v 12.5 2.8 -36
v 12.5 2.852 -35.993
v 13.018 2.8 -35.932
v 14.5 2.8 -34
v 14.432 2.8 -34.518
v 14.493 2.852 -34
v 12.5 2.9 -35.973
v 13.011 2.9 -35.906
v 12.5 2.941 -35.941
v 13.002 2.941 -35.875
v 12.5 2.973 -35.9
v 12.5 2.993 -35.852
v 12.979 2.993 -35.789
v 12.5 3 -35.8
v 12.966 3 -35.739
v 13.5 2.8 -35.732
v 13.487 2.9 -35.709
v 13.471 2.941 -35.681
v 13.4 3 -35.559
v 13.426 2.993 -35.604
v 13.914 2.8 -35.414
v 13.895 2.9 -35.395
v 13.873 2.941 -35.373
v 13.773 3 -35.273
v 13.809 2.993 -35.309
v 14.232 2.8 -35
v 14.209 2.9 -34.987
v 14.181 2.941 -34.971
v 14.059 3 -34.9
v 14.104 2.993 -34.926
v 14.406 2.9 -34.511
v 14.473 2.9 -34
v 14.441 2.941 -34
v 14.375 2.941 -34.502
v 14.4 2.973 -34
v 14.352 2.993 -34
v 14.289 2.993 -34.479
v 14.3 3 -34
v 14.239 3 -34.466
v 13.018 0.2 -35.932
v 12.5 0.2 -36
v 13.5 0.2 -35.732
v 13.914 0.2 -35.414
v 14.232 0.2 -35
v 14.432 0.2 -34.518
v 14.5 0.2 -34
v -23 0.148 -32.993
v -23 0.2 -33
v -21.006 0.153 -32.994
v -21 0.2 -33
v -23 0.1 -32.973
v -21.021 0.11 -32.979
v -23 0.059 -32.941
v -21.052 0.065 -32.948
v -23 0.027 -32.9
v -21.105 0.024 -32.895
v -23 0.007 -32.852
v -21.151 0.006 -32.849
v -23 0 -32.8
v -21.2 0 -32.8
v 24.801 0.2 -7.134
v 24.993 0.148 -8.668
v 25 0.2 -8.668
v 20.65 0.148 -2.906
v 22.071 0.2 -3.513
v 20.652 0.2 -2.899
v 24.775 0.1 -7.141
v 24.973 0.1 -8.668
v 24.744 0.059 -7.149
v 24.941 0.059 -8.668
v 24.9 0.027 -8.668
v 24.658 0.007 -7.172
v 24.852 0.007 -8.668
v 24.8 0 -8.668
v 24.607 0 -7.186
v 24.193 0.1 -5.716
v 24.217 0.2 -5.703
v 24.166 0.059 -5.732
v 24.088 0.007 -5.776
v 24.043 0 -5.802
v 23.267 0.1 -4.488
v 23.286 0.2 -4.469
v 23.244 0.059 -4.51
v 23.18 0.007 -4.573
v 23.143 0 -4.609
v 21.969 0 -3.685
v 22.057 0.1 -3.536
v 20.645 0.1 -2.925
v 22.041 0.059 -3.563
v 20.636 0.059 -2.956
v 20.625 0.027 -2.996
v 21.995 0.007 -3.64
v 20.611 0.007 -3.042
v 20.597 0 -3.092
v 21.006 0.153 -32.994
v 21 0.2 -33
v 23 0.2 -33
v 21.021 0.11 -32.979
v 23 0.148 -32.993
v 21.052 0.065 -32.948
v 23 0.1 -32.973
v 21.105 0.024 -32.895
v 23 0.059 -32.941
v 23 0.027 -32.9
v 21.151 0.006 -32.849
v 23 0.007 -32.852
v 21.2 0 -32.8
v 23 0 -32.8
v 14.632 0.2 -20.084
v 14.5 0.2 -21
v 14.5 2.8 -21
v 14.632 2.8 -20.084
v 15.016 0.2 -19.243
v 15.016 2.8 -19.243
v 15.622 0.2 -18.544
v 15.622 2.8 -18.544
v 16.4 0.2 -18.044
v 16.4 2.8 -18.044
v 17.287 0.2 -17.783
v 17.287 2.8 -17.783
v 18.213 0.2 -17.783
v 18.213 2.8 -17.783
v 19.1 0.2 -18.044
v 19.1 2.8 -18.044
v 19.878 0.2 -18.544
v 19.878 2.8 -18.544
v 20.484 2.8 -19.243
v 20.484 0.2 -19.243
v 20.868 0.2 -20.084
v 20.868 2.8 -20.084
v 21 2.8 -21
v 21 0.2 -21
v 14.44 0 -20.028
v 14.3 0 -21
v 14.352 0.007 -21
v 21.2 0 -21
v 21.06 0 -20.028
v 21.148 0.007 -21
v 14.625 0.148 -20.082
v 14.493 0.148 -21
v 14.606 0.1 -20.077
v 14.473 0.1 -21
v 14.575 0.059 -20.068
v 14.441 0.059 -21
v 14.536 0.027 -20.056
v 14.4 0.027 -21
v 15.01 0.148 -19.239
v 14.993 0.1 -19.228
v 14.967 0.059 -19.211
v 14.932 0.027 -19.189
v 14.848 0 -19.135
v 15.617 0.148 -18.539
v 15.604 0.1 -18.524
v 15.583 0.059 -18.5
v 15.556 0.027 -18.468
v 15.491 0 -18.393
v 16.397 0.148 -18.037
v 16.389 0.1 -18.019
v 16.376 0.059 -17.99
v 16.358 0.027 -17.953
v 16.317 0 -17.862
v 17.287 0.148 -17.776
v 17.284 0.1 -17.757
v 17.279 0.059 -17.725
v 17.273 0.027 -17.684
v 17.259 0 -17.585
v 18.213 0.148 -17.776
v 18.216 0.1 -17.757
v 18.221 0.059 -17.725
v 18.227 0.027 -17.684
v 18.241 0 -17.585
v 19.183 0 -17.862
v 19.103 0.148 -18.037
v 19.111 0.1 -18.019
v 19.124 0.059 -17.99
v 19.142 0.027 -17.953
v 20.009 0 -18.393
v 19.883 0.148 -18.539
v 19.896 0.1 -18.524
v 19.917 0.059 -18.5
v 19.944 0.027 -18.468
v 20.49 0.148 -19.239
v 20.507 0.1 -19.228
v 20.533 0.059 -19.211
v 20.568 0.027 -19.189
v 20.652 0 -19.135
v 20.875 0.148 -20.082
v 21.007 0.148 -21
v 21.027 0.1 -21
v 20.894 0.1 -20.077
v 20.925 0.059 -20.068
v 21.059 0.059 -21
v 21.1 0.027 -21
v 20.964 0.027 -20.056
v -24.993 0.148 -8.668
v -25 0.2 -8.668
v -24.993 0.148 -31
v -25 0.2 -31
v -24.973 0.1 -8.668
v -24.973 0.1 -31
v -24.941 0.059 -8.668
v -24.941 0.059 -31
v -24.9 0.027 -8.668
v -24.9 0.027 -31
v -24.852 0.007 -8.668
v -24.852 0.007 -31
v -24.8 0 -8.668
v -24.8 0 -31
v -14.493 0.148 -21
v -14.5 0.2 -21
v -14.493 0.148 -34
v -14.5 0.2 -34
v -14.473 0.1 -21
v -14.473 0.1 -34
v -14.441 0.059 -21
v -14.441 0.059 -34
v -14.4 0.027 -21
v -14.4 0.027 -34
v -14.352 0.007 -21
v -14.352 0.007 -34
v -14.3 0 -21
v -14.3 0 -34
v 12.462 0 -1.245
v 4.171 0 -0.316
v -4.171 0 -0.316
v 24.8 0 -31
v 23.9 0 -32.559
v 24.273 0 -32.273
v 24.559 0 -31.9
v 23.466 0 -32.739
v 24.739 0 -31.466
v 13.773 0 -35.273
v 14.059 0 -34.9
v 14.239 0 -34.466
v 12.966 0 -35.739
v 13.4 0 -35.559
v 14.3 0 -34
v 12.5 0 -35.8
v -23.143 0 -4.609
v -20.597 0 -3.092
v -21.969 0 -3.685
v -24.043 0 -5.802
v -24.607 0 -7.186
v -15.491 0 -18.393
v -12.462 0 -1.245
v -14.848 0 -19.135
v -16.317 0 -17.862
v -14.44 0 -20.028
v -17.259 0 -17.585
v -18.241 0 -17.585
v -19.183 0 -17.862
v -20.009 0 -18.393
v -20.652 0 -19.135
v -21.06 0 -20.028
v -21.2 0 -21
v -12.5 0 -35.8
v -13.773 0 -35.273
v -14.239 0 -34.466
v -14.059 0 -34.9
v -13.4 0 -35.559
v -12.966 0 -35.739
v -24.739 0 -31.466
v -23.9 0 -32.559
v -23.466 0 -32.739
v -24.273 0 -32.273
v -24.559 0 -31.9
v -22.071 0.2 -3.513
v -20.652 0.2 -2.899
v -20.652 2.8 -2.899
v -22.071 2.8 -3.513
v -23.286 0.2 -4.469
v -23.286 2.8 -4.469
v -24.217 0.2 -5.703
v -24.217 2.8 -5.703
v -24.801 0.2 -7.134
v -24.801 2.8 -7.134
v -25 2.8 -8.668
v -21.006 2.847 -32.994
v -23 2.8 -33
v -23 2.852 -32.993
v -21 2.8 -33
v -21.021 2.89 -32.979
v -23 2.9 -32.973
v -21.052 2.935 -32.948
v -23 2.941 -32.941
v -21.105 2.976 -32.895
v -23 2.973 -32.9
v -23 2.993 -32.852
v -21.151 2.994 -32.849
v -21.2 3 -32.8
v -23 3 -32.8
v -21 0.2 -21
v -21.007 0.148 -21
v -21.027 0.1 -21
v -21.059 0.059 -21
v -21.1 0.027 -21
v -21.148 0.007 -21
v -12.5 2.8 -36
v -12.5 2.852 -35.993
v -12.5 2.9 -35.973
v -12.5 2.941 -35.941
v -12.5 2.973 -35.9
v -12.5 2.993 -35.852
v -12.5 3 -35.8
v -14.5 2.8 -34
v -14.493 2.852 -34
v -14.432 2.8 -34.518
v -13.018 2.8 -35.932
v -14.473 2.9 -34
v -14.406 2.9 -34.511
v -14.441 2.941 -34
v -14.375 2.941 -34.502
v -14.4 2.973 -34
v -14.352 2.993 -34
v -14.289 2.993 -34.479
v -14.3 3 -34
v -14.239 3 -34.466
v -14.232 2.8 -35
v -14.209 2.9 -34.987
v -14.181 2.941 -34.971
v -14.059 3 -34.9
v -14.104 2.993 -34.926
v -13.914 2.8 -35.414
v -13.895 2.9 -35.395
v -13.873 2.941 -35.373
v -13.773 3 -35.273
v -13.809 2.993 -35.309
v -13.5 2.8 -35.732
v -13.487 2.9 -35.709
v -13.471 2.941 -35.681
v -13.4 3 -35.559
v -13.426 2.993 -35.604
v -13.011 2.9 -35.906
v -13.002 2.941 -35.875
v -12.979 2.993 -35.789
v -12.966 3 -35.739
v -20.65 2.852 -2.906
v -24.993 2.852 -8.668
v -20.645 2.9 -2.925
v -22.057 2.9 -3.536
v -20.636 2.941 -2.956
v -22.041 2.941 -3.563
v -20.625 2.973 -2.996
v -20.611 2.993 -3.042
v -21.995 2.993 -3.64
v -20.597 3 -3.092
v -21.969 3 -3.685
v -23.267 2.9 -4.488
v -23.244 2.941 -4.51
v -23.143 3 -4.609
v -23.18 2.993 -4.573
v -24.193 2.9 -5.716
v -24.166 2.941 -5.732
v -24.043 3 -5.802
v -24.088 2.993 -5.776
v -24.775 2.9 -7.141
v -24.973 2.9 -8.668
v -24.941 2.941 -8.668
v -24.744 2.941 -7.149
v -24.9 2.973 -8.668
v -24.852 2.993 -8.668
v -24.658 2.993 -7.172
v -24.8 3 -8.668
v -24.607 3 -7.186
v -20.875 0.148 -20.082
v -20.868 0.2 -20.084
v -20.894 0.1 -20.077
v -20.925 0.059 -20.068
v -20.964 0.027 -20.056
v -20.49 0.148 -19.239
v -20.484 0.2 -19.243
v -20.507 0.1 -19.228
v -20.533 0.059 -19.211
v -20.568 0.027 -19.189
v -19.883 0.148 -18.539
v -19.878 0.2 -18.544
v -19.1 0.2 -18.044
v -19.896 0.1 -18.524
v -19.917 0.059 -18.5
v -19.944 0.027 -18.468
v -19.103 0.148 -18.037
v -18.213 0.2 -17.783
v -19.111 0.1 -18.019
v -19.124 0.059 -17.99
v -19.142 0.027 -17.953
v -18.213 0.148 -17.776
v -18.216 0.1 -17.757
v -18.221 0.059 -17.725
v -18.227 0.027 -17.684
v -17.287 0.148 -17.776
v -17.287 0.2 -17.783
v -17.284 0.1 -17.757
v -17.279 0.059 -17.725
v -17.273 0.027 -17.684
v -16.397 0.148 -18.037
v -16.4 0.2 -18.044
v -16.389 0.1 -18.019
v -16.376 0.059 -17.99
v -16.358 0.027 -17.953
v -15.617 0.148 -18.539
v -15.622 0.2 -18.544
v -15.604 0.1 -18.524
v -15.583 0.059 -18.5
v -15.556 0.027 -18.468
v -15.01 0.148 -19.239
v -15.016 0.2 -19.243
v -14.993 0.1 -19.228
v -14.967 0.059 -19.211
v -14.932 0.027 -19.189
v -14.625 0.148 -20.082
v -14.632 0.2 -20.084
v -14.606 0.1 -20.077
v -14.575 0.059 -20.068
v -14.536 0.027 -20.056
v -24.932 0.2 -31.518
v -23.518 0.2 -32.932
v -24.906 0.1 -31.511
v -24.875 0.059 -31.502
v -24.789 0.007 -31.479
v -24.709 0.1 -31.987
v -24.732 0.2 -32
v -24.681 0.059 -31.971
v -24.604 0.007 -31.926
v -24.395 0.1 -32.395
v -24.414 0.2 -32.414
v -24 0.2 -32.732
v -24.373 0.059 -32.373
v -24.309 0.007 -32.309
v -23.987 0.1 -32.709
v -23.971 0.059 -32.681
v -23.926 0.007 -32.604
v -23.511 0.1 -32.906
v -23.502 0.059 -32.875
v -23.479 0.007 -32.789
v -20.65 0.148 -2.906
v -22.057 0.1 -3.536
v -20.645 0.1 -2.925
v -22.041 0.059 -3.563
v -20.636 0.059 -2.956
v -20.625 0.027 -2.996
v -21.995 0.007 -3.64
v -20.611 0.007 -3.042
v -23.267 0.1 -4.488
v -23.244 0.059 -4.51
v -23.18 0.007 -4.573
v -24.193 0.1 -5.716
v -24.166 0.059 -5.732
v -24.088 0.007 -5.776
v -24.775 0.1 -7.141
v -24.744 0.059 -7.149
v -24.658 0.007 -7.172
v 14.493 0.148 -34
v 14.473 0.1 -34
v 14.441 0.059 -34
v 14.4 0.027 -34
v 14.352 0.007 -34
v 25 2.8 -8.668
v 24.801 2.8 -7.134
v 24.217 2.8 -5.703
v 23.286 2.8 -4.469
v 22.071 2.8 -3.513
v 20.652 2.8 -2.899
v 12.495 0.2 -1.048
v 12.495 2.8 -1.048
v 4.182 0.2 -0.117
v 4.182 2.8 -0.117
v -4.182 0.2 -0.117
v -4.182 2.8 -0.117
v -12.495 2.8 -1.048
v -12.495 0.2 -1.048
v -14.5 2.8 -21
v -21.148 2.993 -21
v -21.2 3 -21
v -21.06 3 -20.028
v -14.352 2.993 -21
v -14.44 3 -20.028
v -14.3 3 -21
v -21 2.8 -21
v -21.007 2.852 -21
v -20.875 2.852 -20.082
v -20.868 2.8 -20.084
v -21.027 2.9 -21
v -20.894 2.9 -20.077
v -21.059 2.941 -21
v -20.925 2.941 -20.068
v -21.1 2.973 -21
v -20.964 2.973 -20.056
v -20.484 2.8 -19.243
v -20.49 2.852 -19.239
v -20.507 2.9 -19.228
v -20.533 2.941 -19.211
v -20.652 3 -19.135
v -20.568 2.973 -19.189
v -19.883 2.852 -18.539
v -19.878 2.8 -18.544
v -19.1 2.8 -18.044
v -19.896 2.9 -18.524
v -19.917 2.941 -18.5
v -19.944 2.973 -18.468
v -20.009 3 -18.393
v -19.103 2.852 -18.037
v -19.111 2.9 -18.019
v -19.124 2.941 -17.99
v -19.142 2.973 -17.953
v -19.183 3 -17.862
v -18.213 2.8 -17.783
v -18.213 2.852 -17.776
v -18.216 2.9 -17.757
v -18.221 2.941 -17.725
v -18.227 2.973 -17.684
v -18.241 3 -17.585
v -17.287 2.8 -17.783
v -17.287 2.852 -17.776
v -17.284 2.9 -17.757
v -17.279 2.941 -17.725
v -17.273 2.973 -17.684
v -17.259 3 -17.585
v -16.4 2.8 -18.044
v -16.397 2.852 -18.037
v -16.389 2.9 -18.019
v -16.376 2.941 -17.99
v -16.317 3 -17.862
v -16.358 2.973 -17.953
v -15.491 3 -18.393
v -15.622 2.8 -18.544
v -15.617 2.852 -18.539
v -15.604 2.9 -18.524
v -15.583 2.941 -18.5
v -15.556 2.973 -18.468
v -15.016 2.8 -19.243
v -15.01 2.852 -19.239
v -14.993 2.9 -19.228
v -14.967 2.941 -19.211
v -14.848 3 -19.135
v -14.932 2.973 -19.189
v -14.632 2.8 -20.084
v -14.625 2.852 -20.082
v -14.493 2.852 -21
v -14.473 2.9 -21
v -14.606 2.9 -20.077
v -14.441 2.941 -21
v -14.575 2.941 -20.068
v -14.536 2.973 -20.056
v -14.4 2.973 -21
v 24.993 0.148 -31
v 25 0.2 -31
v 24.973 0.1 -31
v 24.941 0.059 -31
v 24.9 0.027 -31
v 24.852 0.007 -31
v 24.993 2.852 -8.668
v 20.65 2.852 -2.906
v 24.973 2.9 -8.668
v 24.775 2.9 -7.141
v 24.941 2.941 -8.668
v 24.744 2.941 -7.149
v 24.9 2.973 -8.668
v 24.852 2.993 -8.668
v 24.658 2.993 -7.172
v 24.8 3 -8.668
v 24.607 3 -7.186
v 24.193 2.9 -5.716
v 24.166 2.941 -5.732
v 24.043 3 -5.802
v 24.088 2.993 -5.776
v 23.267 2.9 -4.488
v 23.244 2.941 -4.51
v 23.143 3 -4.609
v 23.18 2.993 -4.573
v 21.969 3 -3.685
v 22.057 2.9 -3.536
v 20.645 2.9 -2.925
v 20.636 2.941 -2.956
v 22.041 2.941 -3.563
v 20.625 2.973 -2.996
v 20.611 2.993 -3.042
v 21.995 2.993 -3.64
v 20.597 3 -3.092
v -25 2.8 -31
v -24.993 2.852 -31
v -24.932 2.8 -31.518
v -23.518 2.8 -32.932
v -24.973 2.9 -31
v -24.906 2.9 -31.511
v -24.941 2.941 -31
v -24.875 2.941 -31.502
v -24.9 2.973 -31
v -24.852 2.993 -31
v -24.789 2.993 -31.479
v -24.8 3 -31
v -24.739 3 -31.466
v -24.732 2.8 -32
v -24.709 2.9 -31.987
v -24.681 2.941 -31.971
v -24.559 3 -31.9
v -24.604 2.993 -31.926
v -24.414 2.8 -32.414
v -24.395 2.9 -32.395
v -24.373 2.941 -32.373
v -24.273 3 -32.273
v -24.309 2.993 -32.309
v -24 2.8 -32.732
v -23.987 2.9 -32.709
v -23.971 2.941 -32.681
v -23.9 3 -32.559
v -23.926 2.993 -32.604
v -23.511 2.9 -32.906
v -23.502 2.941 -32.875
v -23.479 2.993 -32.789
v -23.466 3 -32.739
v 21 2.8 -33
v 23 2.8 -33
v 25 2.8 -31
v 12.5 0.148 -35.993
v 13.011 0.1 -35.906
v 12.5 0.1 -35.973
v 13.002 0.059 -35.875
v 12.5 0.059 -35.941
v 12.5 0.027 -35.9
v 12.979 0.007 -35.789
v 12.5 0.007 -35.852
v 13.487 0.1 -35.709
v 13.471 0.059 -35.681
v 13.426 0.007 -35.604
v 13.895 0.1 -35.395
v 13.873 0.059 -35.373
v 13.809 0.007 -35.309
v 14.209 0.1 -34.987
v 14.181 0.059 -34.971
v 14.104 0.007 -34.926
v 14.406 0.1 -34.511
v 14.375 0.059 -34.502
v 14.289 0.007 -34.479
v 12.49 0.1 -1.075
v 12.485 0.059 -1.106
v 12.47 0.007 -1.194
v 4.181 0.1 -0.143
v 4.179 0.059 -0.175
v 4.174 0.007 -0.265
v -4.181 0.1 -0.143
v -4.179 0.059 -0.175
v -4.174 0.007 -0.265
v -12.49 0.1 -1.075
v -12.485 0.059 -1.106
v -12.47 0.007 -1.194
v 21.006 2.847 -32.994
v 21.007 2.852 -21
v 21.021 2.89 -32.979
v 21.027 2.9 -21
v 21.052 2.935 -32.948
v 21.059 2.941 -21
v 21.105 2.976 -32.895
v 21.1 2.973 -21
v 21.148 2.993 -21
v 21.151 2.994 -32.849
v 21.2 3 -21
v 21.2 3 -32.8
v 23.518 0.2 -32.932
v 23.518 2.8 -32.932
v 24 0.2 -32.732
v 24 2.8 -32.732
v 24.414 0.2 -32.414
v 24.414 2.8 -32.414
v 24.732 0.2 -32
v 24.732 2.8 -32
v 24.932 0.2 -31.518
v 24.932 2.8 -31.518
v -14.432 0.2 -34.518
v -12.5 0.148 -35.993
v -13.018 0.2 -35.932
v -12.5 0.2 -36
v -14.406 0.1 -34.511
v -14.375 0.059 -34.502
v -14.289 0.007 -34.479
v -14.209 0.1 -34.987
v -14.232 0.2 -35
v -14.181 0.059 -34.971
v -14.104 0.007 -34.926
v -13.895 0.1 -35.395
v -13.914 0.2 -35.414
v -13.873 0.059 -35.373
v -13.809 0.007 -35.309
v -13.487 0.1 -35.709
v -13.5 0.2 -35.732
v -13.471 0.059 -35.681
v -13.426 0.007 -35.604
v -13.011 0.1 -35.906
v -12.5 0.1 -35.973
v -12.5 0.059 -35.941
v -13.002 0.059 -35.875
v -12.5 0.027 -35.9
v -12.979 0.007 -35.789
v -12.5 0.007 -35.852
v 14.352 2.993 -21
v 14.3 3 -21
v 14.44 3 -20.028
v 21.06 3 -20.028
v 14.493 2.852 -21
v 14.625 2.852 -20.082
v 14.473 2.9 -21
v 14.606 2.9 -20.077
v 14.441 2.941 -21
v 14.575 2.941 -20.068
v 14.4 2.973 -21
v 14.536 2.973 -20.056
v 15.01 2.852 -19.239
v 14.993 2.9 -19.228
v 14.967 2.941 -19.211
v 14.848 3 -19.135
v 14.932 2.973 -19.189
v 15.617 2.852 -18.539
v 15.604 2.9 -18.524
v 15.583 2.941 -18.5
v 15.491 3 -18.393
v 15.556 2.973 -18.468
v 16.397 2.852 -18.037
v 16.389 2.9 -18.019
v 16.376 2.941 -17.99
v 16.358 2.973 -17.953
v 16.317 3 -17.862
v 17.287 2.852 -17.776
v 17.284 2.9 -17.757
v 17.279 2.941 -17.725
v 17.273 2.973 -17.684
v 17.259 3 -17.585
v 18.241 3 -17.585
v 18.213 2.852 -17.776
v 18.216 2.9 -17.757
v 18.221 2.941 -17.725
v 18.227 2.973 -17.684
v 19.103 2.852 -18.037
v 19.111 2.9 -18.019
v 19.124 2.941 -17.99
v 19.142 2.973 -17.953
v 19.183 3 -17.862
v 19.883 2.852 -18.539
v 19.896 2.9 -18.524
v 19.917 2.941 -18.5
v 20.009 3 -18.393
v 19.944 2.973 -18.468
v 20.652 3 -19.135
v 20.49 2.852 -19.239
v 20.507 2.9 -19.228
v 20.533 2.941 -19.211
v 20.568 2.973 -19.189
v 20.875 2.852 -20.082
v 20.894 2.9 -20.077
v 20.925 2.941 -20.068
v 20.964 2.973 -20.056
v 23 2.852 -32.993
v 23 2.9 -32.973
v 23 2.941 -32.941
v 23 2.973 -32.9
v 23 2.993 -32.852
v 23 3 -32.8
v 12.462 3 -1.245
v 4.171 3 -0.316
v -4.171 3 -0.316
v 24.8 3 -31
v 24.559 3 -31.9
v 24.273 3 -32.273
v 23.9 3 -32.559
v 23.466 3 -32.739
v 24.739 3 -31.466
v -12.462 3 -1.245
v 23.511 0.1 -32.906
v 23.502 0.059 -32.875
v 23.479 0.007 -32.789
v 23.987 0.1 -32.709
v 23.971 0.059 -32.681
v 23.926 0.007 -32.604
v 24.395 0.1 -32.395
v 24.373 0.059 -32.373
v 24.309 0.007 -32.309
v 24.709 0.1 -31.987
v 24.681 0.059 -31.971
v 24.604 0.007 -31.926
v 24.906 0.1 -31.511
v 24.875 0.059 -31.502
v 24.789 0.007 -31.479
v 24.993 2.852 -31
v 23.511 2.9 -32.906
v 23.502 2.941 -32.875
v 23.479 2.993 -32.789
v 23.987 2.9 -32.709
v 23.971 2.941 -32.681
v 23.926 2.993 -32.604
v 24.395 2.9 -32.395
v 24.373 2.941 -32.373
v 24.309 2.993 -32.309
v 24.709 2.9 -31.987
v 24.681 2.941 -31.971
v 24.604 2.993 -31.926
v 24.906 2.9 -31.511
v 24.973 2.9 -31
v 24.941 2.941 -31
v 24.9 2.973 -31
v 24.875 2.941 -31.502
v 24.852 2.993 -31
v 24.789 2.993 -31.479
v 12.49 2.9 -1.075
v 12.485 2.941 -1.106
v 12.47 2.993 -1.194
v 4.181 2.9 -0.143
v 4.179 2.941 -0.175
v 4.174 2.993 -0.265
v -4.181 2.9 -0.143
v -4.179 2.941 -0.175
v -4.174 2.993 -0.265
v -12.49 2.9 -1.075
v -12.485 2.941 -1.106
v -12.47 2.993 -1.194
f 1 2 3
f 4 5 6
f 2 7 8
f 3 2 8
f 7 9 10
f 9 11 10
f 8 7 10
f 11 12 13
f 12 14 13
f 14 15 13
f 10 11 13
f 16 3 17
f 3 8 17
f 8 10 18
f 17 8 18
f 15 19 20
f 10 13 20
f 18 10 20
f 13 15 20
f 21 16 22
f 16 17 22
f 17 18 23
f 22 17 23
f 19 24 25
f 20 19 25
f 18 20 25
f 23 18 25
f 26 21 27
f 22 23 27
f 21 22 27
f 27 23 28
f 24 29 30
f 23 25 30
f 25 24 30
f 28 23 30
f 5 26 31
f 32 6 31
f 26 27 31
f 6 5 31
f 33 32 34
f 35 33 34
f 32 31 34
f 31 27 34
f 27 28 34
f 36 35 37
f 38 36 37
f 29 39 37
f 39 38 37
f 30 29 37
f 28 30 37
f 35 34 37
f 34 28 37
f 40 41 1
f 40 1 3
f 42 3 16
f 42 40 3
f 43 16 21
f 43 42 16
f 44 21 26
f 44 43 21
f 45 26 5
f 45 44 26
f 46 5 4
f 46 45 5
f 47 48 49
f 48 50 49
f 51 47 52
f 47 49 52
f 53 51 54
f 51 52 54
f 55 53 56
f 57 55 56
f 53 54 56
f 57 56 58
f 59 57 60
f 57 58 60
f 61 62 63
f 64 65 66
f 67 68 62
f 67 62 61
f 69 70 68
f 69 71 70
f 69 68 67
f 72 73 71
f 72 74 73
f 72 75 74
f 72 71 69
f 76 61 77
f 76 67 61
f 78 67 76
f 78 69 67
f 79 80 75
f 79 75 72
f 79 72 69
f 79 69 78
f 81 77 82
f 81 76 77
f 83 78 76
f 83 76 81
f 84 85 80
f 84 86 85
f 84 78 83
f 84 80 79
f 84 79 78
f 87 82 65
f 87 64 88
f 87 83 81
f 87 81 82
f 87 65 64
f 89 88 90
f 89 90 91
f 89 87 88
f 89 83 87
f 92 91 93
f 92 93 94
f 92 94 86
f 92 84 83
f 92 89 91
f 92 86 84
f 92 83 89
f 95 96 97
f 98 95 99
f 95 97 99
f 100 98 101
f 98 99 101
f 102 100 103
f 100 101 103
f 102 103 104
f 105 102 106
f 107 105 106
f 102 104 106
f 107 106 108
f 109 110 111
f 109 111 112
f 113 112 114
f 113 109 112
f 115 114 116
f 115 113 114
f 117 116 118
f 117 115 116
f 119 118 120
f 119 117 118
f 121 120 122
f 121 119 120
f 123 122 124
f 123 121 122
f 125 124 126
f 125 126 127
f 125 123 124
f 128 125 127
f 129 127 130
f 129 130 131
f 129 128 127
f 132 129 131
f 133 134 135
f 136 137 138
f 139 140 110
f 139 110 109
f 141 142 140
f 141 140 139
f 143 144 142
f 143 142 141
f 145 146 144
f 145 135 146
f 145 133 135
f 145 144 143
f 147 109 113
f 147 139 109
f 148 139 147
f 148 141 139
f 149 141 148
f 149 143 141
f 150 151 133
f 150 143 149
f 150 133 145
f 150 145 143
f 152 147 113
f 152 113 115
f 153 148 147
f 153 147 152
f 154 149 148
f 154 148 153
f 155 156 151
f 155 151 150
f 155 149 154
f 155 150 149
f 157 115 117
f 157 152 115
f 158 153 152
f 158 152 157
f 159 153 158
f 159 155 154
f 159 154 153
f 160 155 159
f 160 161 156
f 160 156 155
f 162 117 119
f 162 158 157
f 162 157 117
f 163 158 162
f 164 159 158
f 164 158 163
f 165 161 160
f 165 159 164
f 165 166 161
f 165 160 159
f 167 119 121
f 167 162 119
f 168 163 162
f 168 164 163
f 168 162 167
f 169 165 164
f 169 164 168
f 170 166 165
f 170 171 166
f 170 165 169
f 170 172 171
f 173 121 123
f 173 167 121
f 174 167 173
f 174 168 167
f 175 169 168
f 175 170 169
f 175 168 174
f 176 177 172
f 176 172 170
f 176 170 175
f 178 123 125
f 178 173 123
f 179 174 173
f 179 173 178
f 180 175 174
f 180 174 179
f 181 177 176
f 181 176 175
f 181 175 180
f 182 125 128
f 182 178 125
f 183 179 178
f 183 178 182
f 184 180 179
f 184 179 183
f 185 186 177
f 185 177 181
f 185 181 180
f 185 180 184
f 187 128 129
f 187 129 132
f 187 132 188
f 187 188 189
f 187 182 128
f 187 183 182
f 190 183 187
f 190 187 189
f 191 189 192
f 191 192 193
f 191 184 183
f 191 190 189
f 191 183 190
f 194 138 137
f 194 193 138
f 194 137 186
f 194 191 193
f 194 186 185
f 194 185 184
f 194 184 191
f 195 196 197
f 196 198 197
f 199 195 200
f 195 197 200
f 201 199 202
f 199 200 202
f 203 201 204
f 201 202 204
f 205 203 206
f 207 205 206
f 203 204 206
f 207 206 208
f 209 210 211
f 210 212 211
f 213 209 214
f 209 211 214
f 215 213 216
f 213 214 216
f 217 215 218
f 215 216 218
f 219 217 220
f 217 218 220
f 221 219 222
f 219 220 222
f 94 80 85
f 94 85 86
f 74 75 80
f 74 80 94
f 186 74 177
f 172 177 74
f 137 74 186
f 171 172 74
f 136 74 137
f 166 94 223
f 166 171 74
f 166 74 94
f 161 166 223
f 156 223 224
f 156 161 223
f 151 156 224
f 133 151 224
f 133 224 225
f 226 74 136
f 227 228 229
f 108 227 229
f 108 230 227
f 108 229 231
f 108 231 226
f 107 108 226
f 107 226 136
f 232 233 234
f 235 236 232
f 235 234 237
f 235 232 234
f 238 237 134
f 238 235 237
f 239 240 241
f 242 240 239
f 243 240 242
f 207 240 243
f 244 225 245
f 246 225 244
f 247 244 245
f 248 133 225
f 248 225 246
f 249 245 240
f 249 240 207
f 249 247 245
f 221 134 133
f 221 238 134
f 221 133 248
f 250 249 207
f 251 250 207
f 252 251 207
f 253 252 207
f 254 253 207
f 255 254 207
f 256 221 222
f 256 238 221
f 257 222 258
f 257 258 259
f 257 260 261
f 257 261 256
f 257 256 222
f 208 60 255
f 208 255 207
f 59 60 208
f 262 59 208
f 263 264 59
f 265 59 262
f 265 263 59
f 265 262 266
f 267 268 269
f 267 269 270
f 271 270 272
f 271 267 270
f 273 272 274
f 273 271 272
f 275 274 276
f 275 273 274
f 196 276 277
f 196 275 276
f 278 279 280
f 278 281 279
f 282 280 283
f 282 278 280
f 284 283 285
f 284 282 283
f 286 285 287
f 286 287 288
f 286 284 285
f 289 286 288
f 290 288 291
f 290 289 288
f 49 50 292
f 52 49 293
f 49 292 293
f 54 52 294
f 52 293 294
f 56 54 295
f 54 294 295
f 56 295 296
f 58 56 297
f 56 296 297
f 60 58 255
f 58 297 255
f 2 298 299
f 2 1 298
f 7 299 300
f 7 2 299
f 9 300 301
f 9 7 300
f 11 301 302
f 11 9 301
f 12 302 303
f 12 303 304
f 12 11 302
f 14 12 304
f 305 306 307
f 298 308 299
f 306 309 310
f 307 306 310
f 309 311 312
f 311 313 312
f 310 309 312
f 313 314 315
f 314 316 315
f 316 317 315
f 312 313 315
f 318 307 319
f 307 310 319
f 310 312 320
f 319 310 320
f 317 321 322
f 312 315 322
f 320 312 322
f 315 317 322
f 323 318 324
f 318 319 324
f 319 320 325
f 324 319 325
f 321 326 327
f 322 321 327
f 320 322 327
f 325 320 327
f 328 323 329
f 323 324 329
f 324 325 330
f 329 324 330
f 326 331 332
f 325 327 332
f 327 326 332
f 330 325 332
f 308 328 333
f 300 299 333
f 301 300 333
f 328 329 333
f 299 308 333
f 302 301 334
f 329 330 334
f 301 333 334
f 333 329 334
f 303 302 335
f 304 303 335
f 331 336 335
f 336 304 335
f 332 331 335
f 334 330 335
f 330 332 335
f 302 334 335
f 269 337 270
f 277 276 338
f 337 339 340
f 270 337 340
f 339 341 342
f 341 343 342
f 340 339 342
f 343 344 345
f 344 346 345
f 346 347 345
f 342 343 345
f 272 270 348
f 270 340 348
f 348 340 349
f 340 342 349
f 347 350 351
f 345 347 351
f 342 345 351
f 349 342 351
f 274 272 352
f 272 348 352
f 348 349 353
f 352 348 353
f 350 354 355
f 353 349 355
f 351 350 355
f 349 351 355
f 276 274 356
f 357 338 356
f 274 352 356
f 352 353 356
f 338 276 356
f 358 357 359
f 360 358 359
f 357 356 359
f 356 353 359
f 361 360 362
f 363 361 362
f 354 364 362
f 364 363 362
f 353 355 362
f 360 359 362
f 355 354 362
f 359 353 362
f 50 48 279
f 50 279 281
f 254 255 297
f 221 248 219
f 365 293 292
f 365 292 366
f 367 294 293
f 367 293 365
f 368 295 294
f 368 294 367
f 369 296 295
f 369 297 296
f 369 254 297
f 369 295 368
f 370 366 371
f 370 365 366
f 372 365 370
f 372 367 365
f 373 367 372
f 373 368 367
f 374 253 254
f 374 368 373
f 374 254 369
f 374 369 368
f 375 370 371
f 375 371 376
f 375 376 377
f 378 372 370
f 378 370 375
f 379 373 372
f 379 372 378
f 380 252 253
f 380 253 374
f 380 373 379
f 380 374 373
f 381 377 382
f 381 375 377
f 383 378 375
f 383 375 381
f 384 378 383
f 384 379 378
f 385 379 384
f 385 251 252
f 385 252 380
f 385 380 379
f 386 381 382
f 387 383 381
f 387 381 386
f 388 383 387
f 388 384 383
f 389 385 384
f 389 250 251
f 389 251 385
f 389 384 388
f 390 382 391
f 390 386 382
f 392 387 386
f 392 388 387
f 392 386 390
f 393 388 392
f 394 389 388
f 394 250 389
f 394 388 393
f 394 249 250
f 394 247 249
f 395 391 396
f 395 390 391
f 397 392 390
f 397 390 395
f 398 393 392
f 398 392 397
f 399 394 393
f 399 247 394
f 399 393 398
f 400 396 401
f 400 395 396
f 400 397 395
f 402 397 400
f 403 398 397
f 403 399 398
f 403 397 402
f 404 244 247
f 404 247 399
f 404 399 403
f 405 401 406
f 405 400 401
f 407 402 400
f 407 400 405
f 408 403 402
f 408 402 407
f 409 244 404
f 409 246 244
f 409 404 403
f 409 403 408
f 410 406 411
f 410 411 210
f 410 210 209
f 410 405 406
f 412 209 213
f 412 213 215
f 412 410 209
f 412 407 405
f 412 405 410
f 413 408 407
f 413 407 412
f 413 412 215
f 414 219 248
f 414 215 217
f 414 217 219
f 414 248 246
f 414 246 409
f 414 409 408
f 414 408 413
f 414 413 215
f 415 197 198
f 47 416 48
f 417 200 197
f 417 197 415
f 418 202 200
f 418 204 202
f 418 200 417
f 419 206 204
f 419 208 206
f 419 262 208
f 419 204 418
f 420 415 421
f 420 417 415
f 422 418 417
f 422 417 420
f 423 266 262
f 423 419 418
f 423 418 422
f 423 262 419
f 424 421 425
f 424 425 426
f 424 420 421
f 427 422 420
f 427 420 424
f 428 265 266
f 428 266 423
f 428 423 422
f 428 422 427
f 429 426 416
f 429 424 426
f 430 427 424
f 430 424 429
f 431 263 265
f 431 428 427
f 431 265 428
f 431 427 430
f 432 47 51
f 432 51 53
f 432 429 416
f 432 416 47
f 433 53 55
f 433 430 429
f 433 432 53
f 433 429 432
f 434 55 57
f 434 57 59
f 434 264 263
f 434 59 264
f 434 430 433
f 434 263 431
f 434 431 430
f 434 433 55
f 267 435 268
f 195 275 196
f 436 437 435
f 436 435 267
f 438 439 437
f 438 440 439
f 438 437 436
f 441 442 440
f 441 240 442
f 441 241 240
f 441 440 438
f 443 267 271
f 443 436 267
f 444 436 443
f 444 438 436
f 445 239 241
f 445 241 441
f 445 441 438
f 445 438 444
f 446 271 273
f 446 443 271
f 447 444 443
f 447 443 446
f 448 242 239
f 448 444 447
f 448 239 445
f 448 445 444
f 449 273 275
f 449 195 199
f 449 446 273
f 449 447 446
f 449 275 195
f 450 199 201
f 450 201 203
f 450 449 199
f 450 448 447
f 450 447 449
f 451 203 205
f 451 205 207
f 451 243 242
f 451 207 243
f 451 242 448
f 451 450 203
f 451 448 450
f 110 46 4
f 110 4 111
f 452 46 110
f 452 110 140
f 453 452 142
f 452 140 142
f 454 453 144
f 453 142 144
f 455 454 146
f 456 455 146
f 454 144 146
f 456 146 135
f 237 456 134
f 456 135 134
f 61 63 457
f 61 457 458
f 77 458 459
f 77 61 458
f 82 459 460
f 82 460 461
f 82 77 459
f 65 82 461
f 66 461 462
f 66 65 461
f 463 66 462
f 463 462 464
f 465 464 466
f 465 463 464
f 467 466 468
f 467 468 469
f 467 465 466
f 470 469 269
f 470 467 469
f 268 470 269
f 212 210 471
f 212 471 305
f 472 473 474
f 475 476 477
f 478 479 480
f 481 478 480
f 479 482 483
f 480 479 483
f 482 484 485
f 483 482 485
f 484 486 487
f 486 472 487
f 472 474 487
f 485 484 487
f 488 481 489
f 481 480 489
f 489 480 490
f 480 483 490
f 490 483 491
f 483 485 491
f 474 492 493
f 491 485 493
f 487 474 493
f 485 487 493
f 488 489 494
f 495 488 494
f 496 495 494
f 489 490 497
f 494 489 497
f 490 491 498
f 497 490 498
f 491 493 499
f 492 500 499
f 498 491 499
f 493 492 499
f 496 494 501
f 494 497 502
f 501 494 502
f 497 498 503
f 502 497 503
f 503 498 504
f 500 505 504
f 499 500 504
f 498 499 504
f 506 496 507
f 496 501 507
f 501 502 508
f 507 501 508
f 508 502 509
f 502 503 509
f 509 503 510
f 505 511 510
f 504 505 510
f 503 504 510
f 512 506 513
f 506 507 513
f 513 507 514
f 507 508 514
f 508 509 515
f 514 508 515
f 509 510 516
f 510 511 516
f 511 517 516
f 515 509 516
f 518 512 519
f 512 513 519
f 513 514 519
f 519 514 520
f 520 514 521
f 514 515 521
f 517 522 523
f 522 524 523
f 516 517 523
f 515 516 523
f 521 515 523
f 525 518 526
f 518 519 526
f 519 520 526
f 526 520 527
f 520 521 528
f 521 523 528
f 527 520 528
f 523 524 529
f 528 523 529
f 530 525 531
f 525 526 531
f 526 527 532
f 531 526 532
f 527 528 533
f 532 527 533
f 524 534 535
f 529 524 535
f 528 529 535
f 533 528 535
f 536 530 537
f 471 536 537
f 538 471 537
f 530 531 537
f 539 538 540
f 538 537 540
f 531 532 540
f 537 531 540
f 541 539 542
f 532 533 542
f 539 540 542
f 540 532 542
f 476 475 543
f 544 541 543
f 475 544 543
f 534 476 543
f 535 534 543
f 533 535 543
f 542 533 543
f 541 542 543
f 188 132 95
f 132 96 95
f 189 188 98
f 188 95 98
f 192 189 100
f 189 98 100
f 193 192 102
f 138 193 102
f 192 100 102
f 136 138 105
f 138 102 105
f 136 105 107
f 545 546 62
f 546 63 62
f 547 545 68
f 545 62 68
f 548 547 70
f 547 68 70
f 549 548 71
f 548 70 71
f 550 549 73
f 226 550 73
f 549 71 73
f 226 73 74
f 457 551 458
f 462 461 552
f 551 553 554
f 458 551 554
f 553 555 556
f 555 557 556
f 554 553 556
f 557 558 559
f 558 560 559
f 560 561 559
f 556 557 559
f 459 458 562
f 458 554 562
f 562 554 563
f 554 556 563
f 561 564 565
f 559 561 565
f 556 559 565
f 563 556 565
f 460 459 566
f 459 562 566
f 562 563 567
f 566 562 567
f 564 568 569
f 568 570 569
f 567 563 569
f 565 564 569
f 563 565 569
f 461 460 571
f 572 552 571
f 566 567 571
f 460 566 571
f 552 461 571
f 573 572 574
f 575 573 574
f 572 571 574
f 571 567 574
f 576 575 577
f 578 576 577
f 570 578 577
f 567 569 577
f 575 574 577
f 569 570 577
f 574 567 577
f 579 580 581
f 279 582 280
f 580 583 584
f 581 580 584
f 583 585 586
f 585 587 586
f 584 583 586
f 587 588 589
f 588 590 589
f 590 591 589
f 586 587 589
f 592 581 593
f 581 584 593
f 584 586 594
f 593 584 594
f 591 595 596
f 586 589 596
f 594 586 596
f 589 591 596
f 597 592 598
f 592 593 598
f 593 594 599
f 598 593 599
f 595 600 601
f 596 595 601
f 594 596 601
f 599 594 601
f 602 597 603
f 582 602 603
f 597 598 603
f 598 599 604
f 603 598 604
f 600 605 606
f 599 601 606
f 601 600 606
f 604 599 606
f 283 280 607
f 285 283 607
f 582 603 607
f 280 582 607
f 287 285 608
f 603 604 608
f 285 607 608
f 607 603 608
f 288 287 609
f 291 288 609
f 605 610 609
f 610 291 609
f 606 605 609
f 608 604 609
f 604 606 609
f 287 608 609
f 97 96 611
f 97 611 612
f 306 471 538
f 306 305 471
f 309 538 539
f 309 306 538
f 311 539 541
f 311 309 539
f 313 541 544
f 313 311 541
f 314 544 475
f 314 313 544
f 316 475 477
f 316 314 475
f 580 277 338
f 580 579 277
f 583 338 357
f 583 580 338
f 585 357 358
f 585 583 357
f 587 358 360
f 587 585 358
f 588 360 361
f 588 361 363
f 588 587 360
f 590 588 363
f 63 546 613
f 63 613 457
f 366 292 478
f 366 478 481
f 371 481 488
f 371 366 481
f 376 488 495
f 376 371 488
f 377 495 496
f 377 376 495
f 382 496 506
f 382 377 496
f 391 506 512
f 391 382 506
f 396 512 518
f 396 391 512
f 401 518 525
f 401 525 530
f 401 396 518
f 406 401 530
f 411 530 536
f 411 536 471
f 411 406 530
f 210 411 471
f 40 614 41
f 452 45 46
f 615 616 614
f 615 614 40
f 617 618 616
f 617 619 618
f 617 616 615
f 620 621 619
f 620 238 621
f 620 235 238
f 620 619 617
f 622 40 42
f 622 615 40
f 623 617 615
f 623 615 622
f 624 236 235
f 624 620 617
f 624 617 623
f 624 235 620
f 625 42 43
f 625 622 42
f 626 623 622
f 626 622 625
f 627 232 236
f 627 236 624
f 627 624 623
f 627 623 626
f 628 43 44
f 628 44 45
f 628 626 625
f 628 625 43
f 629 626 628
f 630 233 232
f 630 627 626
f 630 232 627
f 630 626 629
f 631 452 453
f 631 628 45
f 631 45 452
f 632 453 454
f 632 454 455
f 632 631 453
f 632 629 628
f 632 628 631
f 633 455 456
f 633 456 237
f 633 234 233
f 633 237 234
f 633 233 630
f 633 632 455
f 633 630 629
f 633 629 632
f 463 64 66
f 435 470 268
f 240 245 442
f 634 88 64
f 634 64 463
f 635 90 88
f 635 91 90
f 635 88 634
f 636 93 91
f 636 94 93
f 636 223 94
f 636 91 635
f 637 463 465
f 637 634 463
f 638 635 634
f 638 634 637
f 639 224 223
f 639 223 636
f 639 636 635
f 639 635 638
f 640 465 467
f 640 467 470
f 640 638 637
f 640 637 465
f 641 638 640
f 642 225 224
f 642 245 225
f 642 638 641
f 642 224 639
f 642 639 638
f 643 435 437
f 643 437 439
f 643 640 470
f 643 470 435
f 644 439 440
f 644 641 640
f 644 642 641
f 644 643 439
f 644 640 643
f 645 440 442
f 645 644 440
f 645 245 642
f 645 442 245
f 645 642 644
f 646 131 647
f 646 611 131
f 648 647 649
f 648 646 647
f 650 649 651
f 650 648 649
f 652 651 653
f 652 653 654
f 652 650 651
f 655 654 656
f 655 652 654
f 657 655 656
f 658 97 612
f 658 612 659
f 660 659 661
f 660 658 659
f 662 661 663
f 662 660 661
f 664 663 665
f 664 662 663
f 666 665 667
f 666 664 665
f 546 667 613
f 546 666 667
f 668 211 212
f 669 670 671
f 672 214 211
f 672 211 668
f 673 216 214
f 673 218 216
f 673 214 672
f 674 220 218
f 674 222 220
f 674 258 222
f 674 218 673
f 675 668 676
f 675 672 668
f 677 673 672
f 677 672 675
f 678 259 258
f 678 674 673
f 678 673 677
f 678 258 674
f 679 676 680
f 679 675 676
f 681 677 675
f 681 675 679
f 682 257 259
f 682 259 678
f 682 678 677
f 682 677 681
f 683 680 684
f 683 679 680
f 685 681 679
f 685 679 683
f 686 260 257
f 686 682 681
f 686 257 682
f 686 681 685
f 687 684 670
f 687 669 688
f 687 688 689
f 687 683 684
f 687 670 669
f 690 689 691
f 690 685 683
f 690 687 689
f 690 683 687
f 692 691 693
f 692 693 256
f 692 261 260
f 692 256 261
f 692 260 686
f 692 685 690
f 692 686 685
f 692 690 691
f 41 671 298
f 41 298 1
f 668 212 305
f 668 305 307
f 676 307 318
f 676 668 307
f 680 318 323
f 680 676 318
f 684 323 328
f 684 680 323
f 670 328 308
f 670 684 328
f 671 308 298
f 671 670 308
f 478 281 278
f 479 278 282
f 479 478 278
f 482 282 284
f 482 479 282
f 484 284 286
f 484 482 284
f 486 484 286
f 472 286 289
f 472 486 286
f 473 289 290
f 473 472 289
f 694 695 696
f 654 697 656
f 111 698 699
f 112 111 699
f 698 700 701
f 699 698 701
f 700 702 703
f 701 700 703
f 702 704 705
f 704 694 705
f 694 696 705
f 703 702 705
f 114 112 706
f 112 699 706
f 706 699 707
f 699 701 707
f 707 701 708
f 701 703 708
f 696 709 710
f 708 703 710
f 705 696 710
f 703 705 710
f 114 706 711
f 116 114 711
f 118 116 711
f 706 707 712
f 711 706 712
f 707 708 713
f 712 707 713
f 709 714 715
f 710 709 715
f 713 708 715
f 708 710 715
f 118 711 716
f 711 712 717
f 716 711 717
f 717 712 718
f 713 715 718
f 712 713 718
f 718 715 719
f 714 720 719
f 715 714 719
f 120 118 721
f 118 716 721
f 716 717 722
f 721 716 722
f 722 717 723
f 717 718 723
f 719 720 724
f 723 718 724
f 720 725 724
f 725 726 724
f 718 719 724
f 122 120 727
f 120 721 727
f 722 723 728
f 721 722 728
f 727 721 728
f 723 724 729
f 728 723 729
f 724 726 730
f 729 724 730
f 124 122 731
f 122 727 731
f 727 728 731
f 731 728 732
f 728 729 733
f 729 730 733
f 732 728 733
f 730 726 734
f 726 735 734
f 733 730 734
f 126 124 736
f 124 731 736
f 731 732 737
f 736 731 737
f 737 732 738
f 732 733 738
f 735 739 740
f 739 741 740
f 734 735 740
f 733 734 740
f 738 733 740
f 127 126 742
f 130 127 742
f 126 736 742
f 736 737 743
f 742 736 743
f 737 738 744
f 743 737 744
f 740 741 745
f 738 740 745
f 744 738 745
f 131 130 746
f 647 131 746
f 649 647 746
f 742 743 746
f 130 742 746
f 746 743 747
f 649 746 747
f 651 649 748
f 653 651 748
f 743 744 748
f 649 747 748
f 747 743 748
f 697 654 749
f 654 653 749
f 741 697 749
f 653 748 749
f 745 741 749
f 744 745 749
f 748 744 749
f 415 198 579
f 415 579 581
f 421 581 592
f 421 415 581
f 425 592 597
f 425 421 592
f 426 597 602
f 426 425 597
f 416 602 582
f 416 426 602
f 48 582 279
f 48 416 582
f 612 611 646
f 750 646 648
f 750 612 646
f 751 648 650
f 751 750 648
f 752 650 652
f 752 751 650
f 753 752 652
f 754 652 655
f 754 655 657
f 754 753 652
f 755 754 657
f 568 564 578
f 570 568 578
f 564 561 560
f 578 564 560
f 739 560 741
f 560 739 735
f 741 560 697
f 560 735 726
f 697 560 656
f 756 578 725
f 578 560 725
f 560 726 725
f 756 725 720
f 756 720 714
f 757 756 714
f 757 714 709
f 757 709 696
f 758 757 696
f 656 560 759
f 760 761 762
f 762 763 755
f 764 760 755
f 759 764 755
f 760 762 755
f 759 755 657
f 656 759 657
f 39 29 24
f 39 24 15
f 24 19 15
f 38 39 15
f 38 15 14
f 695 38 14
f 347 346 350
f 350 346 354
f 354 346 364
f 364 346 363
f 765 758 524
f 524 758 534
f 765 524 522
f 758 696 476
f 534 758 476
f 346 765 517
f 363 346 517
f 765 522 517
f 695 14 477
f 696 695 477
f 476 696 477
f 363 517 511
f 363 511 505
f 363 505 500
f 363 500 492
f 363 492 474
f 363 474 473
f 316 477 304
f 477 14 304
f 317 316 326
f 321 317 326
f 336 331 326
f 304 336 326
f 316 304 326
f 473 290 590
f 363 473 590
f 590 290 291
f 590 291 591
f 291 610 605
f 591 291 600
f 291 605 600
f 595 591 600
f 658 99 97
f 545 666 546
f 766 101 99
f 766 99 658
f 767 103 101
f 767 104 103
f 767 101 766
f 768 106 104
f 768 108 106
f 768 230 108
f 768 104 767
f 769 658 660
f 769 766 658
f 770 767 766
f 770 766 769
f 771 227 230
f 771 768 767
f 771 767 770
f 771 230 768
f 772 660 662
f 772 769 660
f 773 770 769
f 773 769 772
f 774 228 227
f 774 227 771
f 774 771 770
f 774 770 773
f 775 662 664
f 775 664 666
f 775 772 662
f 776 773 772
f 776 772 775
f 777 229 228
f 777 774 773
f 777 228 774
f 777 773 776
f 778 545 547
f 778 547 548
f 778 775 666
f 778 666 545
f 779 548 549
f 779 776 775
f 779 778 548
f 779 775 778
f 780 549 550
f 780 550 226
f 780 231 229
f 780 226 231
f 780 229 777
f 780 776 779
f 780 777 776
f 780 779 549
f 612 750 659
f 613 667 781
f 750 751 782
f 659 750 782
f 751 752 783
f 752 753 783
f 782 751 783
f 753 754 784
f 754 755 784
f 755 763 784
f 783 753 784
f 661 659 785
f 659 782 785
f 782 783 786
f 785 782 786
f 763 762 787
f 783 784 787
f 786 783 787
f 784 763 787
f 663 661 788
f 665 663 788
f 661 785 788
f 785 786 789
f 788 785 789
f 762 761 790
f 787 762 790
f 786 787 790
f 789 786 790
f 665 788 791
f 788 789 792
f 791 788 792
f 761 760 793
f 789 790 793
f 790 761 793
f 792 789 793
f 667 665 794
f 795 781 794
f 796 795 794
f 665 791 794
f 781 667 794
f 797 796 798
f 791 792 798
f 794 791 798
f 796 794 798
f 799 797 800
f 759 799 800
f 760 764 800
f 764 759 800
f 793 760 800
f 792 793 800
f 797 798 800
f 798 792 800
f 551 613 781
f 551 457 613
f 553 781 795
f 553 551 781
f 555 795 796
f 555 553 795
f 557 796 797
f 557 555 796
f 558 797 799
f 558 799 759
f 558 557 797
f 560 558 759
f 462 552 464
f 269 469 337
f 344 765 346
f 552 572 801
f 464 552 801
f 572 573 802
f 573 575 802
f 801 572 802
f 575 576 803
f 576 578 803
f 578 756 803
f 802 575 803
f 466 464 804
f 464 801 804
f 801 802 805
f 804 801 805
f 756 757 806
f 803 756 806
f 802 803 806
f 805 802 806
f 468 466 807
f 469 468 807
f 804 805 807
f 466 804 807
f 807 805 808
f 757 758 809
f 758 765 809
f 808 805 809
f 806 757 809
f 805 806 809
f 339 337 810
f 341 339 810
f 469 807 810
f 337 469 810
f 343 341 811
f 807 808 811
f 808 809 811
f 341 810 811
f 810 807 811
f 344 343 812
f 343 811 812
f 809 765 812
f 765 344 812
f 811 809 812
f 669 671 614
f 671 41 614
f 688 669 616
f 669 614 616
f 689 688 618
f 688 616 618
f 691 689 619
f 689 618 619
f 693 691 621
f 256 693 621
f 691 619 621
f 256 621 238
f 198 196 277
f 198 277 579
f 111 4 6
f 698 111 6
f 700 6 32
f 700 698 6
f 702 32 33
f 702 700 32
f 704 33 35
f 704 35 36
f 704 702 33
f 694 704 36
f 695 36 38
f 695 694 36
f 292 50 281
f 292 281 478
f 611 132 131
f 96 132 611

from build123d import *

# Parameters (mm, degrees)
BOSS_EXTRUDE1_DEPTH = 3
FILLET1_R           = 0.2


with BuildPart() as part:
    # Sketch1 → Boss-Extrude1 (new body)
    with BuildSketch(Plane(origin=(0, 0, 0), x_dir=(1, 0, 0), z_dir=(0, 1, 0))):
        with BuildLine():
            Line((-25, 8.667504193), (-25, 31))
            ThreePointArc((-25, 31), (-24.414213562, 32.414213562), (-23, 33))
            Line((-23, 33), (-21, 33))
            Line((-21, 33), (-21, 21))
            ThreePointArc((-21, 21), (-17.75, 17.75), (-14.5, 21))
            Line((-14.5, 21), (-14.5, 34))
            ThreePointArc((-14.5, 34), (-13.914213562, 35.414213562), (-12.5, 36))
            Line((-12.5, 36), (12.5, 36))
            ThreePointArc((12.5, 36), (13.914213562, 35.414213562), (14.5, 34))
            Line((14.5, 34), (14.5, 21))
            ThreePointArc((14.5, 21), (17.75, 17.75), (21, 21))
            Line((21, 21), (21, 33))
            Line((21, 33), (23, 33))
            ThreePointArc((23, 33), (24.414213562, 32.414213562), (25, 31))
            Line((25, 31), (25, 8.667504193))
            ThreePointArc((25, 8.667504193), (23.791296457, 5.0559286), (20.652173913, 2.899461079))
            ThreePointArc((20.652173913, 2.899461079), (0, 0), (-20.652173913, 2.899461079))
            ThreePointArc((-20.652173913, 2.899461079), (-23.791296457, 5.0559286), (-25, 8.667504193))
        make_face()
    extrude(amount=BOSS_EXTRUDE1_DEPTH)

    # Fillet1
    fillet1_edges = [part.edges().sort_by_distance(p)[0] for p in [
        (-22, 3, -33),
        (-24.414213562, 3, -32.414213562),
        (-14.5, 0, -27.5),
        (-25, 3, -19.833752096),
        (-13.914213562, 0, -35.414213562),
        (0, 0, -36),
        (13.914213562, 0, -35.414213562),
        (14.5, 0, -27.5),
        (17.75, 0, -17.75),
        (21, 0, -27),
        (22, 0, -33),
        (24.414213562, 0, -32.414213562),
        (-23.791296457, 3, -5.0559286),
        (25, 0, -19.833752096),
        (23.791296457, 0, -5.0559286),
        (0, 0, 0),
        (-23.791296457, 0, -5.0559286),
        (-25, 0, -19.833752096),
        (-24.414213562, 0, -32.414213562),
        (-22, 0, -33),
        (0, 3, 0),
        (-21, 0, -27),
        (-17.75, 0, -17.75),
        (23.791296457, 3, -5.0559286),
        (25, 3, -19.833752096),
        (24.414213562, 3, -32.414213562),
        (22, 3, -33),
        (21, 3, -27),
        (-17.75, 3, -17.75),
        (17.75, 3, -17.75),
        (14.5, 3, -27.5),
        (13.914213562, 3, -35.414213562),
        (0, 3, -36),
        (-13.914213562, 3, -35.414213562),
        (-14.5, 3, -27.5),
        (-21, 3, -27),
    ]]
    fillet(fillet1_edges, radius=FILLET1_R)


solid = part.part
